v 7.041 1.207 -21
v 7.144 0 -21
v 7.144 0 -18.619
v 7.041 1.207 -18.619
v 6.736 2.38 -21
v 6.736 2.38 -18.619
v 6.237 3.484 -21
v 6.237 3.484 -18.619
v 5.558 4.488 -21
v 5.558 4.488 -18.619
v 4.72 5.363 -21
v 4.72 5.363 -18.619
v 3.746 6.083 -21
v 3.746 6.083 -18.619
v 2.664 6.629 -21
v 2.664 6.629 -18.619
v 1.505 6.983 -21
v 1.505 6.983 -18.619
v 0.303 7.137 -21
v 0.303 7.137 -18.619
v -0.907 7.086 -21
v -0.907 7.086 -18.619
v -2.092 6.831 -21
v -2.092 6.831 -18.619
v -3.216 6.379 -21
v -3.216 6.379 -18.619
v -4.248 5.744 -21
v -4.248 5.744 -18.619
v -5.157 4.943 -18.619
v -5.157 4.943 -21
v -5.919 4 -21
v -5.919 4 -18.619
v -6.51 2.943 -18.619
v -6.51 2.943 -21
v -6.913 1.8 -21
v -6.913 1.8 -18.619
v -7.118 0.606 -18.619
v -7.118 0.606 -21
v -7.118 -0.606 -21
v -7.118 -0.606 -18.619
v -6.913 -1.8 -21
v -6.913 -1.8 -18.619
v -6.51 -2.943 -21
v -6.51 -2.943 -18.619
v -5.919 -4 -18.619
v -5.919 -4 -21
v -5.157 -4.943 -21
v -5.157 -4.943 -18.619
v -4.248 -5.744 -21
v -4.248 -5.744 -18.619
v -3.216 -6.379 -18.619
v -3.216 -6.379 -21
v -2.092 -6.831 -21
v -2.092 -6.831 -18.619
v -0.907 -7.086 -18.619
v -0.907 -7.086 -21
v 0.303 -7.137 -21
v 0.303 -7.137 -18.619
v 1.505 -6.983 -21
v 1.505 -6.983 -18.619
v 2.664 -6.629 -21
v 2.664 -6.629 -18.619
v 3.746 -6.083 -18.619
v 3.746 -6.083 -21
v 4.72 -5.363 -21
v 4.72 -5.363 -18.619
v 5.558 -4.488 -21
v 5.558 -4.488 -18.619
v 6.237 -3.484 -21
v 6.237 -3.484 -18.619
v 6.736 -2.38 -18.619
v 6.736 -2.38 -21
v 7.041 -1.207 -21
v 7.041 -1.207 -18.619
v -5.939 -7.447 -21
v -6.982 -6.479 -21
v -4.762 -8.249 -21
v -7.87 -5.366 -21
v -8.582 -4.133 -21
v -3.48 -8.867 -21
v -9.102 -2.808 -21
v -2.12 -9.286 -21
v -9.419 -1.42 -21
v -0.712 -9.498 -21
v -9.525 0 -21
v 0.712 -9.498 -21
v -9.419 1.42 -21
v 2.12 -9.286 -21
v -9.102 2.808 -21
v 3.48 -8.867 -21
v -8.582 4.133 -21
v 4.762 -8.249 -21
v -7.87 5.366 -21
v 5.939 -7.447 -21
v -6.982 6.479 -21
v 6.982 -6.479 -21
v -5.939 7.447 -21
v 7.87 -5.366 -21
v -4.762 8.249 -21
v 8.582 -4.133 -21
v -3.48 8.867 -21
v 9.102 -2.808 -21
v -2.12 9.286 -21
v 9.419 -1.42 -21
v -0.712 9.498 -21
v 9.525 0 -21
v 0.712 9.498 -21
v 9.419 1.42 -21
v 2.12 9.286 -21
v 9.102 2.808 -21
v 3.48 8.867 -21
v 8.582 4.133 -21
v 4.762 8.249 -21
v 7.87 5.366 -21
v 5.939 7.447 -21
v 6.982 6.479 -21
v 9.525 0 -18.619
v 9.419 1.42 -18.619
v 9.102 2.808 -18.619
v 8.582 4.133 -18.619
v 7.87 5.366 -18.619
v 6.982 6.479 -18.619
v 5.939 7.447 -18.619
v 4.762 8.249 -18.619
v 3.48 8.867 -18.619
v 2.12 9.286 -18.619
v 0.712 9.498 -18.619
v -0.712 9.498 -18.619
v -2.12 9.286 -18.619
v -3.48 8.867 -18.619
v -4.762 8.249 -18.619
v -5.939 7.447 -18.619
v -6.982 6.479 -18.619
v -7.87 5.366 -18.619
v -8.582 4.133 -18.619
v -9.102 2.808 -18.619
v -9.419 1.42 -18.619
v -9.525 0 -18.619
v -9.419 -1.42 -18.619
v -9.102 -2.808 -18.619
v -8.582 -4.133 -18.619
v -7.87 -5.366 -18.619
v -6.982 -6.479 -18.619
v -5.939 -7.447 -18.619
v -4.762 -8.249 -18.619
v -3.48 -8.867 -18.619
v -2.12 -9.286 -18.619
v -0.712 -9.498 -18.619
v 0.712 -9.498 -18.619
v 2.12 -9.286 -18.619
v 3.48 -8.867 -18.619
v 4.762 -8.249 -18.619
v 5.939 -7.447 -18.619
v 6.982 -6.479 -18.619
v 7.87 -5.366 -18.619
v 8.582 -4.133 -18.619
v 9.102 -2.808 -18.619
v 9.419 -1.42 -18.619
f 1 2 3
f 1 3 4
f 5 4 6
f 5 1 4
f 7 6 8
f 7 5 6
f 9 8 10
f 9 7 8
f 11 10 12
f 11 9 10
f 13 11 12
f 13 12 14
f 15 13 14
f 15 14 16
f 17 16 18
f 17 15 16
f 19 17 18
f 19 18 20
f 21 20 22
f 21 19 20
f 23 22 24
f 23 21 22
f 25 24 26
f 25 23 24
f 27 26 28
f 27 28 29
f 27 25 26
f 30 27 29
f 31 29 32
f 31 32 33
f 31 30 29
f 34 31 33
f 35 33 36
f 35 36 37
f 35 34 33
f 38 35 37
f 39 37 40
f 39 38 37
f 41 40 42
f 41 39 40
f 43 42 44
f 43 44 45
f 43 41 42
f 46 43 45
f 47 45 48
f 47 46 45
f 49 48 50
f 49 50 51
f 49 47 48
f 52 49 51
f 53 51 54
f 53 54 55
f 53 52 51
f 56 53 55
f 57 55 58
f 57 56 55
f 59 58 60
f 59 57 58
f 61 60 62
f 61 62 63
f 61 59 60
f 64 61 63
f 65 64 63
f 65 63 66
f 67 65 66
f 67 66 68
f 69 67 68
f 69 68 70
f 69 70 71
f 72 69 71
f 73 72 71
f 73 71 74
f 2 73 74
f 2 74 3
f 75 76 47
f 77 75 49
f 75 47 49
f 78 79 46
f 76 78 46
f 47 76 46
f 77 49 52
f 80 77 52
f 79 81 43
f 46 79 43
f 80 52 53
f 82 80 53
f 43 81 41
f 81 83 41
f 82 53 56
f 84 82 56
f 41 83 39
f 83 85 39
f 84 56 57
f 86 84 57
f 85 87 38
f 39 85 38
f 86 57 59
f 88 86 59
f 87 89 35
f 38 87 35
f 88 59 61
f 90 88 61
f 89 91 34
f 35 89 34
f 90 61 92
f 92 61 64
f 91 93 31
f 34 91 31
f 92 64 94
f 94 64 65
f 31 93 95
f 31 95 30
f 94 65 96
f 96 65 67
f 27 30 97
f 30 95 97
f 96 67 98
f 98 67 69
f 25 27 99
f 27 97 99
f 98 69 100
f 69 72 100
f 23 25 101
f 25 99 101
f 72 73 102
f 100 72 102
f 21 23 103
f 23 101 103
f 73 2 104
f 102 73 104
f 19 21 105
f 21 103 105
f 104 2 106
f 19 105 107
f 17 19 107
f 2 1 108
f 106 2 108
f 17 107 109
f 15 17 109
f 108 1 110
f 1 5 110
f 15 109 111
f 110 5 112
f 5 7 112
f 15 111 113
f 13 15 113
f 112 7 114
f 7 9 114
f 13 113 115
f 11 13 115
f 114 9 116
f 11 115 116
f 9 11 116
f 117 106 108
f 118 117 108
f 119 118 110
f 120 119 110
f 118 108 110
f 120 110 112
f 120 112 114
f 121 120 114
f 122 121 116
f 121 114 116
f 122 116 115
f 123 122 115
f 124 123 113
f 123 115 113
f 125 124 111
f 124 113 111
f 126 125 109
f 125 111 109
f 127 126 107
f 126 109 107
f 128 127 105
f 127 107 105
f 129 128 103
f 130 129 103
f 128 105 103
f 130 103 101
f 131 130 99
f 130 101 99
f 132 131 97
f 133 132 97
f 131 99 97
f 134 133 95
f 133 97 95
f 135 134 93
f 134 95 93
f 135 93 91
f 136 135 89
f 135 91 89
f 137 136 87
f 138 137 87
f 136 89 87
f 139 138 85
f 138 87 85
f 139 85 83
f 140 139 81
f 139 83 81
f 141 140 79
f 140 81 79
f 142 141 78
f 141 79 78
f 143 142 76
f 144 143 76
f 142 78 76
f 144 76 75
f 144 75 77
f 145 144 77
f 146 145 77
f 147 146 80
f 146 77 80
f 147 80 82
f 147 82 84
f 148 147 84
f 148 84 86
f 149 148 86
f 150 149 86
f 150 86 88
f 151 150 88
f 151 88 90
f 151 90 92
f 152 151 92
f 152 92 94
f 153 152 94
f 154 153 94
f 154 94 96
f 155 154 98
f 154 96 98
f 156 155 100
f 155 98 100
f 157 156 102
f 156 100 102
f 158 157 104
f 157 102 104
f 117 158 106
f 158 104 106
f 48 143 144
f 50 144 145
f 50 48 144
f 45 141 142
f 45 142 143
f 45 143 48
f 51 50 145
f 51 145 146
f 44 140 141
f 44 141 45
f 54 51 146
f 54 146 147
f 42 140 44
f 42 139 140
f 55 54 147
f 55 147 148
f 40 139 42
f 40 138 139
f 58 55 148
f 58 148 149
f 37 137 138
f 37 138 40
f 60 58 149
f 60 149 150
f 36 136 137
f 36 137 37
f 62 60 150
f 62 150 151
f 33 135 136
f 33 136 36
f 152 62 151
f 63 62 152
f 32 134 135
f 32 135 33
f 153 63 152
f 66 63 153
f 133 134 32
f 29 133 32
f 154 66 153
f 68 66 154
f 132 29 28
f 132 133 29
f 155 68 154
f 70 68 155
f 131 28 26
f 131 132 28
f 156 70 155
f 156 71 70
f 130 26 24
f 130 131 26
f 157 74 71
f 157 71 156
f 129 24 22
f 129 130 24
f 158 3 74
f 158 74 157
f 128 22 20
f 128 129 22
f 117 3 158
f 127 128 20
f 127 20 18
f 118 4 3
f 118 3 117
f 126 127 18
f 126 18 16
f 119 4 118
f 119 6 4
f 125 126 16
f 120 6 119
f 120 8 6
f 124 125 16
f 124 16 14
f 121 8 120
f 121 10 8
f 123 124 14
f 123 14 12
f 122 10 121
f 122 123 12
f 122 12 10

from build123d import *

# Parameters (mm, degrees)
CYLINDER154_R     = 7.14375
CYLINDER154_DEPTH = 2.38125
CYLINDER155_R     = 9.525
CYLINDER155_DEPTH = 2.38125


with BuildPart() as cylinder008:
    # Cylinder154 → Cylinder154 (new body)
    with BuildSketch(Plane.XY.offset(-21)):
        Circle(CYLINDER154_R)
    extrude(amount=CYLINDER154_DEPTH)


with BuildPart() as cut019:
    # Cylinder155 → Cylinder155 (new body)
    with BuildSketch(Plane.XY.offset(-21)):
        Circle(CYLINDER155_R)
    extrude(amount=CYLINDER155_DEPTH)

    # Cut019: cut Cylinder008
    add(cylinder008.part, mode=Mode.SUBTRACT)


solid = cut019.part
